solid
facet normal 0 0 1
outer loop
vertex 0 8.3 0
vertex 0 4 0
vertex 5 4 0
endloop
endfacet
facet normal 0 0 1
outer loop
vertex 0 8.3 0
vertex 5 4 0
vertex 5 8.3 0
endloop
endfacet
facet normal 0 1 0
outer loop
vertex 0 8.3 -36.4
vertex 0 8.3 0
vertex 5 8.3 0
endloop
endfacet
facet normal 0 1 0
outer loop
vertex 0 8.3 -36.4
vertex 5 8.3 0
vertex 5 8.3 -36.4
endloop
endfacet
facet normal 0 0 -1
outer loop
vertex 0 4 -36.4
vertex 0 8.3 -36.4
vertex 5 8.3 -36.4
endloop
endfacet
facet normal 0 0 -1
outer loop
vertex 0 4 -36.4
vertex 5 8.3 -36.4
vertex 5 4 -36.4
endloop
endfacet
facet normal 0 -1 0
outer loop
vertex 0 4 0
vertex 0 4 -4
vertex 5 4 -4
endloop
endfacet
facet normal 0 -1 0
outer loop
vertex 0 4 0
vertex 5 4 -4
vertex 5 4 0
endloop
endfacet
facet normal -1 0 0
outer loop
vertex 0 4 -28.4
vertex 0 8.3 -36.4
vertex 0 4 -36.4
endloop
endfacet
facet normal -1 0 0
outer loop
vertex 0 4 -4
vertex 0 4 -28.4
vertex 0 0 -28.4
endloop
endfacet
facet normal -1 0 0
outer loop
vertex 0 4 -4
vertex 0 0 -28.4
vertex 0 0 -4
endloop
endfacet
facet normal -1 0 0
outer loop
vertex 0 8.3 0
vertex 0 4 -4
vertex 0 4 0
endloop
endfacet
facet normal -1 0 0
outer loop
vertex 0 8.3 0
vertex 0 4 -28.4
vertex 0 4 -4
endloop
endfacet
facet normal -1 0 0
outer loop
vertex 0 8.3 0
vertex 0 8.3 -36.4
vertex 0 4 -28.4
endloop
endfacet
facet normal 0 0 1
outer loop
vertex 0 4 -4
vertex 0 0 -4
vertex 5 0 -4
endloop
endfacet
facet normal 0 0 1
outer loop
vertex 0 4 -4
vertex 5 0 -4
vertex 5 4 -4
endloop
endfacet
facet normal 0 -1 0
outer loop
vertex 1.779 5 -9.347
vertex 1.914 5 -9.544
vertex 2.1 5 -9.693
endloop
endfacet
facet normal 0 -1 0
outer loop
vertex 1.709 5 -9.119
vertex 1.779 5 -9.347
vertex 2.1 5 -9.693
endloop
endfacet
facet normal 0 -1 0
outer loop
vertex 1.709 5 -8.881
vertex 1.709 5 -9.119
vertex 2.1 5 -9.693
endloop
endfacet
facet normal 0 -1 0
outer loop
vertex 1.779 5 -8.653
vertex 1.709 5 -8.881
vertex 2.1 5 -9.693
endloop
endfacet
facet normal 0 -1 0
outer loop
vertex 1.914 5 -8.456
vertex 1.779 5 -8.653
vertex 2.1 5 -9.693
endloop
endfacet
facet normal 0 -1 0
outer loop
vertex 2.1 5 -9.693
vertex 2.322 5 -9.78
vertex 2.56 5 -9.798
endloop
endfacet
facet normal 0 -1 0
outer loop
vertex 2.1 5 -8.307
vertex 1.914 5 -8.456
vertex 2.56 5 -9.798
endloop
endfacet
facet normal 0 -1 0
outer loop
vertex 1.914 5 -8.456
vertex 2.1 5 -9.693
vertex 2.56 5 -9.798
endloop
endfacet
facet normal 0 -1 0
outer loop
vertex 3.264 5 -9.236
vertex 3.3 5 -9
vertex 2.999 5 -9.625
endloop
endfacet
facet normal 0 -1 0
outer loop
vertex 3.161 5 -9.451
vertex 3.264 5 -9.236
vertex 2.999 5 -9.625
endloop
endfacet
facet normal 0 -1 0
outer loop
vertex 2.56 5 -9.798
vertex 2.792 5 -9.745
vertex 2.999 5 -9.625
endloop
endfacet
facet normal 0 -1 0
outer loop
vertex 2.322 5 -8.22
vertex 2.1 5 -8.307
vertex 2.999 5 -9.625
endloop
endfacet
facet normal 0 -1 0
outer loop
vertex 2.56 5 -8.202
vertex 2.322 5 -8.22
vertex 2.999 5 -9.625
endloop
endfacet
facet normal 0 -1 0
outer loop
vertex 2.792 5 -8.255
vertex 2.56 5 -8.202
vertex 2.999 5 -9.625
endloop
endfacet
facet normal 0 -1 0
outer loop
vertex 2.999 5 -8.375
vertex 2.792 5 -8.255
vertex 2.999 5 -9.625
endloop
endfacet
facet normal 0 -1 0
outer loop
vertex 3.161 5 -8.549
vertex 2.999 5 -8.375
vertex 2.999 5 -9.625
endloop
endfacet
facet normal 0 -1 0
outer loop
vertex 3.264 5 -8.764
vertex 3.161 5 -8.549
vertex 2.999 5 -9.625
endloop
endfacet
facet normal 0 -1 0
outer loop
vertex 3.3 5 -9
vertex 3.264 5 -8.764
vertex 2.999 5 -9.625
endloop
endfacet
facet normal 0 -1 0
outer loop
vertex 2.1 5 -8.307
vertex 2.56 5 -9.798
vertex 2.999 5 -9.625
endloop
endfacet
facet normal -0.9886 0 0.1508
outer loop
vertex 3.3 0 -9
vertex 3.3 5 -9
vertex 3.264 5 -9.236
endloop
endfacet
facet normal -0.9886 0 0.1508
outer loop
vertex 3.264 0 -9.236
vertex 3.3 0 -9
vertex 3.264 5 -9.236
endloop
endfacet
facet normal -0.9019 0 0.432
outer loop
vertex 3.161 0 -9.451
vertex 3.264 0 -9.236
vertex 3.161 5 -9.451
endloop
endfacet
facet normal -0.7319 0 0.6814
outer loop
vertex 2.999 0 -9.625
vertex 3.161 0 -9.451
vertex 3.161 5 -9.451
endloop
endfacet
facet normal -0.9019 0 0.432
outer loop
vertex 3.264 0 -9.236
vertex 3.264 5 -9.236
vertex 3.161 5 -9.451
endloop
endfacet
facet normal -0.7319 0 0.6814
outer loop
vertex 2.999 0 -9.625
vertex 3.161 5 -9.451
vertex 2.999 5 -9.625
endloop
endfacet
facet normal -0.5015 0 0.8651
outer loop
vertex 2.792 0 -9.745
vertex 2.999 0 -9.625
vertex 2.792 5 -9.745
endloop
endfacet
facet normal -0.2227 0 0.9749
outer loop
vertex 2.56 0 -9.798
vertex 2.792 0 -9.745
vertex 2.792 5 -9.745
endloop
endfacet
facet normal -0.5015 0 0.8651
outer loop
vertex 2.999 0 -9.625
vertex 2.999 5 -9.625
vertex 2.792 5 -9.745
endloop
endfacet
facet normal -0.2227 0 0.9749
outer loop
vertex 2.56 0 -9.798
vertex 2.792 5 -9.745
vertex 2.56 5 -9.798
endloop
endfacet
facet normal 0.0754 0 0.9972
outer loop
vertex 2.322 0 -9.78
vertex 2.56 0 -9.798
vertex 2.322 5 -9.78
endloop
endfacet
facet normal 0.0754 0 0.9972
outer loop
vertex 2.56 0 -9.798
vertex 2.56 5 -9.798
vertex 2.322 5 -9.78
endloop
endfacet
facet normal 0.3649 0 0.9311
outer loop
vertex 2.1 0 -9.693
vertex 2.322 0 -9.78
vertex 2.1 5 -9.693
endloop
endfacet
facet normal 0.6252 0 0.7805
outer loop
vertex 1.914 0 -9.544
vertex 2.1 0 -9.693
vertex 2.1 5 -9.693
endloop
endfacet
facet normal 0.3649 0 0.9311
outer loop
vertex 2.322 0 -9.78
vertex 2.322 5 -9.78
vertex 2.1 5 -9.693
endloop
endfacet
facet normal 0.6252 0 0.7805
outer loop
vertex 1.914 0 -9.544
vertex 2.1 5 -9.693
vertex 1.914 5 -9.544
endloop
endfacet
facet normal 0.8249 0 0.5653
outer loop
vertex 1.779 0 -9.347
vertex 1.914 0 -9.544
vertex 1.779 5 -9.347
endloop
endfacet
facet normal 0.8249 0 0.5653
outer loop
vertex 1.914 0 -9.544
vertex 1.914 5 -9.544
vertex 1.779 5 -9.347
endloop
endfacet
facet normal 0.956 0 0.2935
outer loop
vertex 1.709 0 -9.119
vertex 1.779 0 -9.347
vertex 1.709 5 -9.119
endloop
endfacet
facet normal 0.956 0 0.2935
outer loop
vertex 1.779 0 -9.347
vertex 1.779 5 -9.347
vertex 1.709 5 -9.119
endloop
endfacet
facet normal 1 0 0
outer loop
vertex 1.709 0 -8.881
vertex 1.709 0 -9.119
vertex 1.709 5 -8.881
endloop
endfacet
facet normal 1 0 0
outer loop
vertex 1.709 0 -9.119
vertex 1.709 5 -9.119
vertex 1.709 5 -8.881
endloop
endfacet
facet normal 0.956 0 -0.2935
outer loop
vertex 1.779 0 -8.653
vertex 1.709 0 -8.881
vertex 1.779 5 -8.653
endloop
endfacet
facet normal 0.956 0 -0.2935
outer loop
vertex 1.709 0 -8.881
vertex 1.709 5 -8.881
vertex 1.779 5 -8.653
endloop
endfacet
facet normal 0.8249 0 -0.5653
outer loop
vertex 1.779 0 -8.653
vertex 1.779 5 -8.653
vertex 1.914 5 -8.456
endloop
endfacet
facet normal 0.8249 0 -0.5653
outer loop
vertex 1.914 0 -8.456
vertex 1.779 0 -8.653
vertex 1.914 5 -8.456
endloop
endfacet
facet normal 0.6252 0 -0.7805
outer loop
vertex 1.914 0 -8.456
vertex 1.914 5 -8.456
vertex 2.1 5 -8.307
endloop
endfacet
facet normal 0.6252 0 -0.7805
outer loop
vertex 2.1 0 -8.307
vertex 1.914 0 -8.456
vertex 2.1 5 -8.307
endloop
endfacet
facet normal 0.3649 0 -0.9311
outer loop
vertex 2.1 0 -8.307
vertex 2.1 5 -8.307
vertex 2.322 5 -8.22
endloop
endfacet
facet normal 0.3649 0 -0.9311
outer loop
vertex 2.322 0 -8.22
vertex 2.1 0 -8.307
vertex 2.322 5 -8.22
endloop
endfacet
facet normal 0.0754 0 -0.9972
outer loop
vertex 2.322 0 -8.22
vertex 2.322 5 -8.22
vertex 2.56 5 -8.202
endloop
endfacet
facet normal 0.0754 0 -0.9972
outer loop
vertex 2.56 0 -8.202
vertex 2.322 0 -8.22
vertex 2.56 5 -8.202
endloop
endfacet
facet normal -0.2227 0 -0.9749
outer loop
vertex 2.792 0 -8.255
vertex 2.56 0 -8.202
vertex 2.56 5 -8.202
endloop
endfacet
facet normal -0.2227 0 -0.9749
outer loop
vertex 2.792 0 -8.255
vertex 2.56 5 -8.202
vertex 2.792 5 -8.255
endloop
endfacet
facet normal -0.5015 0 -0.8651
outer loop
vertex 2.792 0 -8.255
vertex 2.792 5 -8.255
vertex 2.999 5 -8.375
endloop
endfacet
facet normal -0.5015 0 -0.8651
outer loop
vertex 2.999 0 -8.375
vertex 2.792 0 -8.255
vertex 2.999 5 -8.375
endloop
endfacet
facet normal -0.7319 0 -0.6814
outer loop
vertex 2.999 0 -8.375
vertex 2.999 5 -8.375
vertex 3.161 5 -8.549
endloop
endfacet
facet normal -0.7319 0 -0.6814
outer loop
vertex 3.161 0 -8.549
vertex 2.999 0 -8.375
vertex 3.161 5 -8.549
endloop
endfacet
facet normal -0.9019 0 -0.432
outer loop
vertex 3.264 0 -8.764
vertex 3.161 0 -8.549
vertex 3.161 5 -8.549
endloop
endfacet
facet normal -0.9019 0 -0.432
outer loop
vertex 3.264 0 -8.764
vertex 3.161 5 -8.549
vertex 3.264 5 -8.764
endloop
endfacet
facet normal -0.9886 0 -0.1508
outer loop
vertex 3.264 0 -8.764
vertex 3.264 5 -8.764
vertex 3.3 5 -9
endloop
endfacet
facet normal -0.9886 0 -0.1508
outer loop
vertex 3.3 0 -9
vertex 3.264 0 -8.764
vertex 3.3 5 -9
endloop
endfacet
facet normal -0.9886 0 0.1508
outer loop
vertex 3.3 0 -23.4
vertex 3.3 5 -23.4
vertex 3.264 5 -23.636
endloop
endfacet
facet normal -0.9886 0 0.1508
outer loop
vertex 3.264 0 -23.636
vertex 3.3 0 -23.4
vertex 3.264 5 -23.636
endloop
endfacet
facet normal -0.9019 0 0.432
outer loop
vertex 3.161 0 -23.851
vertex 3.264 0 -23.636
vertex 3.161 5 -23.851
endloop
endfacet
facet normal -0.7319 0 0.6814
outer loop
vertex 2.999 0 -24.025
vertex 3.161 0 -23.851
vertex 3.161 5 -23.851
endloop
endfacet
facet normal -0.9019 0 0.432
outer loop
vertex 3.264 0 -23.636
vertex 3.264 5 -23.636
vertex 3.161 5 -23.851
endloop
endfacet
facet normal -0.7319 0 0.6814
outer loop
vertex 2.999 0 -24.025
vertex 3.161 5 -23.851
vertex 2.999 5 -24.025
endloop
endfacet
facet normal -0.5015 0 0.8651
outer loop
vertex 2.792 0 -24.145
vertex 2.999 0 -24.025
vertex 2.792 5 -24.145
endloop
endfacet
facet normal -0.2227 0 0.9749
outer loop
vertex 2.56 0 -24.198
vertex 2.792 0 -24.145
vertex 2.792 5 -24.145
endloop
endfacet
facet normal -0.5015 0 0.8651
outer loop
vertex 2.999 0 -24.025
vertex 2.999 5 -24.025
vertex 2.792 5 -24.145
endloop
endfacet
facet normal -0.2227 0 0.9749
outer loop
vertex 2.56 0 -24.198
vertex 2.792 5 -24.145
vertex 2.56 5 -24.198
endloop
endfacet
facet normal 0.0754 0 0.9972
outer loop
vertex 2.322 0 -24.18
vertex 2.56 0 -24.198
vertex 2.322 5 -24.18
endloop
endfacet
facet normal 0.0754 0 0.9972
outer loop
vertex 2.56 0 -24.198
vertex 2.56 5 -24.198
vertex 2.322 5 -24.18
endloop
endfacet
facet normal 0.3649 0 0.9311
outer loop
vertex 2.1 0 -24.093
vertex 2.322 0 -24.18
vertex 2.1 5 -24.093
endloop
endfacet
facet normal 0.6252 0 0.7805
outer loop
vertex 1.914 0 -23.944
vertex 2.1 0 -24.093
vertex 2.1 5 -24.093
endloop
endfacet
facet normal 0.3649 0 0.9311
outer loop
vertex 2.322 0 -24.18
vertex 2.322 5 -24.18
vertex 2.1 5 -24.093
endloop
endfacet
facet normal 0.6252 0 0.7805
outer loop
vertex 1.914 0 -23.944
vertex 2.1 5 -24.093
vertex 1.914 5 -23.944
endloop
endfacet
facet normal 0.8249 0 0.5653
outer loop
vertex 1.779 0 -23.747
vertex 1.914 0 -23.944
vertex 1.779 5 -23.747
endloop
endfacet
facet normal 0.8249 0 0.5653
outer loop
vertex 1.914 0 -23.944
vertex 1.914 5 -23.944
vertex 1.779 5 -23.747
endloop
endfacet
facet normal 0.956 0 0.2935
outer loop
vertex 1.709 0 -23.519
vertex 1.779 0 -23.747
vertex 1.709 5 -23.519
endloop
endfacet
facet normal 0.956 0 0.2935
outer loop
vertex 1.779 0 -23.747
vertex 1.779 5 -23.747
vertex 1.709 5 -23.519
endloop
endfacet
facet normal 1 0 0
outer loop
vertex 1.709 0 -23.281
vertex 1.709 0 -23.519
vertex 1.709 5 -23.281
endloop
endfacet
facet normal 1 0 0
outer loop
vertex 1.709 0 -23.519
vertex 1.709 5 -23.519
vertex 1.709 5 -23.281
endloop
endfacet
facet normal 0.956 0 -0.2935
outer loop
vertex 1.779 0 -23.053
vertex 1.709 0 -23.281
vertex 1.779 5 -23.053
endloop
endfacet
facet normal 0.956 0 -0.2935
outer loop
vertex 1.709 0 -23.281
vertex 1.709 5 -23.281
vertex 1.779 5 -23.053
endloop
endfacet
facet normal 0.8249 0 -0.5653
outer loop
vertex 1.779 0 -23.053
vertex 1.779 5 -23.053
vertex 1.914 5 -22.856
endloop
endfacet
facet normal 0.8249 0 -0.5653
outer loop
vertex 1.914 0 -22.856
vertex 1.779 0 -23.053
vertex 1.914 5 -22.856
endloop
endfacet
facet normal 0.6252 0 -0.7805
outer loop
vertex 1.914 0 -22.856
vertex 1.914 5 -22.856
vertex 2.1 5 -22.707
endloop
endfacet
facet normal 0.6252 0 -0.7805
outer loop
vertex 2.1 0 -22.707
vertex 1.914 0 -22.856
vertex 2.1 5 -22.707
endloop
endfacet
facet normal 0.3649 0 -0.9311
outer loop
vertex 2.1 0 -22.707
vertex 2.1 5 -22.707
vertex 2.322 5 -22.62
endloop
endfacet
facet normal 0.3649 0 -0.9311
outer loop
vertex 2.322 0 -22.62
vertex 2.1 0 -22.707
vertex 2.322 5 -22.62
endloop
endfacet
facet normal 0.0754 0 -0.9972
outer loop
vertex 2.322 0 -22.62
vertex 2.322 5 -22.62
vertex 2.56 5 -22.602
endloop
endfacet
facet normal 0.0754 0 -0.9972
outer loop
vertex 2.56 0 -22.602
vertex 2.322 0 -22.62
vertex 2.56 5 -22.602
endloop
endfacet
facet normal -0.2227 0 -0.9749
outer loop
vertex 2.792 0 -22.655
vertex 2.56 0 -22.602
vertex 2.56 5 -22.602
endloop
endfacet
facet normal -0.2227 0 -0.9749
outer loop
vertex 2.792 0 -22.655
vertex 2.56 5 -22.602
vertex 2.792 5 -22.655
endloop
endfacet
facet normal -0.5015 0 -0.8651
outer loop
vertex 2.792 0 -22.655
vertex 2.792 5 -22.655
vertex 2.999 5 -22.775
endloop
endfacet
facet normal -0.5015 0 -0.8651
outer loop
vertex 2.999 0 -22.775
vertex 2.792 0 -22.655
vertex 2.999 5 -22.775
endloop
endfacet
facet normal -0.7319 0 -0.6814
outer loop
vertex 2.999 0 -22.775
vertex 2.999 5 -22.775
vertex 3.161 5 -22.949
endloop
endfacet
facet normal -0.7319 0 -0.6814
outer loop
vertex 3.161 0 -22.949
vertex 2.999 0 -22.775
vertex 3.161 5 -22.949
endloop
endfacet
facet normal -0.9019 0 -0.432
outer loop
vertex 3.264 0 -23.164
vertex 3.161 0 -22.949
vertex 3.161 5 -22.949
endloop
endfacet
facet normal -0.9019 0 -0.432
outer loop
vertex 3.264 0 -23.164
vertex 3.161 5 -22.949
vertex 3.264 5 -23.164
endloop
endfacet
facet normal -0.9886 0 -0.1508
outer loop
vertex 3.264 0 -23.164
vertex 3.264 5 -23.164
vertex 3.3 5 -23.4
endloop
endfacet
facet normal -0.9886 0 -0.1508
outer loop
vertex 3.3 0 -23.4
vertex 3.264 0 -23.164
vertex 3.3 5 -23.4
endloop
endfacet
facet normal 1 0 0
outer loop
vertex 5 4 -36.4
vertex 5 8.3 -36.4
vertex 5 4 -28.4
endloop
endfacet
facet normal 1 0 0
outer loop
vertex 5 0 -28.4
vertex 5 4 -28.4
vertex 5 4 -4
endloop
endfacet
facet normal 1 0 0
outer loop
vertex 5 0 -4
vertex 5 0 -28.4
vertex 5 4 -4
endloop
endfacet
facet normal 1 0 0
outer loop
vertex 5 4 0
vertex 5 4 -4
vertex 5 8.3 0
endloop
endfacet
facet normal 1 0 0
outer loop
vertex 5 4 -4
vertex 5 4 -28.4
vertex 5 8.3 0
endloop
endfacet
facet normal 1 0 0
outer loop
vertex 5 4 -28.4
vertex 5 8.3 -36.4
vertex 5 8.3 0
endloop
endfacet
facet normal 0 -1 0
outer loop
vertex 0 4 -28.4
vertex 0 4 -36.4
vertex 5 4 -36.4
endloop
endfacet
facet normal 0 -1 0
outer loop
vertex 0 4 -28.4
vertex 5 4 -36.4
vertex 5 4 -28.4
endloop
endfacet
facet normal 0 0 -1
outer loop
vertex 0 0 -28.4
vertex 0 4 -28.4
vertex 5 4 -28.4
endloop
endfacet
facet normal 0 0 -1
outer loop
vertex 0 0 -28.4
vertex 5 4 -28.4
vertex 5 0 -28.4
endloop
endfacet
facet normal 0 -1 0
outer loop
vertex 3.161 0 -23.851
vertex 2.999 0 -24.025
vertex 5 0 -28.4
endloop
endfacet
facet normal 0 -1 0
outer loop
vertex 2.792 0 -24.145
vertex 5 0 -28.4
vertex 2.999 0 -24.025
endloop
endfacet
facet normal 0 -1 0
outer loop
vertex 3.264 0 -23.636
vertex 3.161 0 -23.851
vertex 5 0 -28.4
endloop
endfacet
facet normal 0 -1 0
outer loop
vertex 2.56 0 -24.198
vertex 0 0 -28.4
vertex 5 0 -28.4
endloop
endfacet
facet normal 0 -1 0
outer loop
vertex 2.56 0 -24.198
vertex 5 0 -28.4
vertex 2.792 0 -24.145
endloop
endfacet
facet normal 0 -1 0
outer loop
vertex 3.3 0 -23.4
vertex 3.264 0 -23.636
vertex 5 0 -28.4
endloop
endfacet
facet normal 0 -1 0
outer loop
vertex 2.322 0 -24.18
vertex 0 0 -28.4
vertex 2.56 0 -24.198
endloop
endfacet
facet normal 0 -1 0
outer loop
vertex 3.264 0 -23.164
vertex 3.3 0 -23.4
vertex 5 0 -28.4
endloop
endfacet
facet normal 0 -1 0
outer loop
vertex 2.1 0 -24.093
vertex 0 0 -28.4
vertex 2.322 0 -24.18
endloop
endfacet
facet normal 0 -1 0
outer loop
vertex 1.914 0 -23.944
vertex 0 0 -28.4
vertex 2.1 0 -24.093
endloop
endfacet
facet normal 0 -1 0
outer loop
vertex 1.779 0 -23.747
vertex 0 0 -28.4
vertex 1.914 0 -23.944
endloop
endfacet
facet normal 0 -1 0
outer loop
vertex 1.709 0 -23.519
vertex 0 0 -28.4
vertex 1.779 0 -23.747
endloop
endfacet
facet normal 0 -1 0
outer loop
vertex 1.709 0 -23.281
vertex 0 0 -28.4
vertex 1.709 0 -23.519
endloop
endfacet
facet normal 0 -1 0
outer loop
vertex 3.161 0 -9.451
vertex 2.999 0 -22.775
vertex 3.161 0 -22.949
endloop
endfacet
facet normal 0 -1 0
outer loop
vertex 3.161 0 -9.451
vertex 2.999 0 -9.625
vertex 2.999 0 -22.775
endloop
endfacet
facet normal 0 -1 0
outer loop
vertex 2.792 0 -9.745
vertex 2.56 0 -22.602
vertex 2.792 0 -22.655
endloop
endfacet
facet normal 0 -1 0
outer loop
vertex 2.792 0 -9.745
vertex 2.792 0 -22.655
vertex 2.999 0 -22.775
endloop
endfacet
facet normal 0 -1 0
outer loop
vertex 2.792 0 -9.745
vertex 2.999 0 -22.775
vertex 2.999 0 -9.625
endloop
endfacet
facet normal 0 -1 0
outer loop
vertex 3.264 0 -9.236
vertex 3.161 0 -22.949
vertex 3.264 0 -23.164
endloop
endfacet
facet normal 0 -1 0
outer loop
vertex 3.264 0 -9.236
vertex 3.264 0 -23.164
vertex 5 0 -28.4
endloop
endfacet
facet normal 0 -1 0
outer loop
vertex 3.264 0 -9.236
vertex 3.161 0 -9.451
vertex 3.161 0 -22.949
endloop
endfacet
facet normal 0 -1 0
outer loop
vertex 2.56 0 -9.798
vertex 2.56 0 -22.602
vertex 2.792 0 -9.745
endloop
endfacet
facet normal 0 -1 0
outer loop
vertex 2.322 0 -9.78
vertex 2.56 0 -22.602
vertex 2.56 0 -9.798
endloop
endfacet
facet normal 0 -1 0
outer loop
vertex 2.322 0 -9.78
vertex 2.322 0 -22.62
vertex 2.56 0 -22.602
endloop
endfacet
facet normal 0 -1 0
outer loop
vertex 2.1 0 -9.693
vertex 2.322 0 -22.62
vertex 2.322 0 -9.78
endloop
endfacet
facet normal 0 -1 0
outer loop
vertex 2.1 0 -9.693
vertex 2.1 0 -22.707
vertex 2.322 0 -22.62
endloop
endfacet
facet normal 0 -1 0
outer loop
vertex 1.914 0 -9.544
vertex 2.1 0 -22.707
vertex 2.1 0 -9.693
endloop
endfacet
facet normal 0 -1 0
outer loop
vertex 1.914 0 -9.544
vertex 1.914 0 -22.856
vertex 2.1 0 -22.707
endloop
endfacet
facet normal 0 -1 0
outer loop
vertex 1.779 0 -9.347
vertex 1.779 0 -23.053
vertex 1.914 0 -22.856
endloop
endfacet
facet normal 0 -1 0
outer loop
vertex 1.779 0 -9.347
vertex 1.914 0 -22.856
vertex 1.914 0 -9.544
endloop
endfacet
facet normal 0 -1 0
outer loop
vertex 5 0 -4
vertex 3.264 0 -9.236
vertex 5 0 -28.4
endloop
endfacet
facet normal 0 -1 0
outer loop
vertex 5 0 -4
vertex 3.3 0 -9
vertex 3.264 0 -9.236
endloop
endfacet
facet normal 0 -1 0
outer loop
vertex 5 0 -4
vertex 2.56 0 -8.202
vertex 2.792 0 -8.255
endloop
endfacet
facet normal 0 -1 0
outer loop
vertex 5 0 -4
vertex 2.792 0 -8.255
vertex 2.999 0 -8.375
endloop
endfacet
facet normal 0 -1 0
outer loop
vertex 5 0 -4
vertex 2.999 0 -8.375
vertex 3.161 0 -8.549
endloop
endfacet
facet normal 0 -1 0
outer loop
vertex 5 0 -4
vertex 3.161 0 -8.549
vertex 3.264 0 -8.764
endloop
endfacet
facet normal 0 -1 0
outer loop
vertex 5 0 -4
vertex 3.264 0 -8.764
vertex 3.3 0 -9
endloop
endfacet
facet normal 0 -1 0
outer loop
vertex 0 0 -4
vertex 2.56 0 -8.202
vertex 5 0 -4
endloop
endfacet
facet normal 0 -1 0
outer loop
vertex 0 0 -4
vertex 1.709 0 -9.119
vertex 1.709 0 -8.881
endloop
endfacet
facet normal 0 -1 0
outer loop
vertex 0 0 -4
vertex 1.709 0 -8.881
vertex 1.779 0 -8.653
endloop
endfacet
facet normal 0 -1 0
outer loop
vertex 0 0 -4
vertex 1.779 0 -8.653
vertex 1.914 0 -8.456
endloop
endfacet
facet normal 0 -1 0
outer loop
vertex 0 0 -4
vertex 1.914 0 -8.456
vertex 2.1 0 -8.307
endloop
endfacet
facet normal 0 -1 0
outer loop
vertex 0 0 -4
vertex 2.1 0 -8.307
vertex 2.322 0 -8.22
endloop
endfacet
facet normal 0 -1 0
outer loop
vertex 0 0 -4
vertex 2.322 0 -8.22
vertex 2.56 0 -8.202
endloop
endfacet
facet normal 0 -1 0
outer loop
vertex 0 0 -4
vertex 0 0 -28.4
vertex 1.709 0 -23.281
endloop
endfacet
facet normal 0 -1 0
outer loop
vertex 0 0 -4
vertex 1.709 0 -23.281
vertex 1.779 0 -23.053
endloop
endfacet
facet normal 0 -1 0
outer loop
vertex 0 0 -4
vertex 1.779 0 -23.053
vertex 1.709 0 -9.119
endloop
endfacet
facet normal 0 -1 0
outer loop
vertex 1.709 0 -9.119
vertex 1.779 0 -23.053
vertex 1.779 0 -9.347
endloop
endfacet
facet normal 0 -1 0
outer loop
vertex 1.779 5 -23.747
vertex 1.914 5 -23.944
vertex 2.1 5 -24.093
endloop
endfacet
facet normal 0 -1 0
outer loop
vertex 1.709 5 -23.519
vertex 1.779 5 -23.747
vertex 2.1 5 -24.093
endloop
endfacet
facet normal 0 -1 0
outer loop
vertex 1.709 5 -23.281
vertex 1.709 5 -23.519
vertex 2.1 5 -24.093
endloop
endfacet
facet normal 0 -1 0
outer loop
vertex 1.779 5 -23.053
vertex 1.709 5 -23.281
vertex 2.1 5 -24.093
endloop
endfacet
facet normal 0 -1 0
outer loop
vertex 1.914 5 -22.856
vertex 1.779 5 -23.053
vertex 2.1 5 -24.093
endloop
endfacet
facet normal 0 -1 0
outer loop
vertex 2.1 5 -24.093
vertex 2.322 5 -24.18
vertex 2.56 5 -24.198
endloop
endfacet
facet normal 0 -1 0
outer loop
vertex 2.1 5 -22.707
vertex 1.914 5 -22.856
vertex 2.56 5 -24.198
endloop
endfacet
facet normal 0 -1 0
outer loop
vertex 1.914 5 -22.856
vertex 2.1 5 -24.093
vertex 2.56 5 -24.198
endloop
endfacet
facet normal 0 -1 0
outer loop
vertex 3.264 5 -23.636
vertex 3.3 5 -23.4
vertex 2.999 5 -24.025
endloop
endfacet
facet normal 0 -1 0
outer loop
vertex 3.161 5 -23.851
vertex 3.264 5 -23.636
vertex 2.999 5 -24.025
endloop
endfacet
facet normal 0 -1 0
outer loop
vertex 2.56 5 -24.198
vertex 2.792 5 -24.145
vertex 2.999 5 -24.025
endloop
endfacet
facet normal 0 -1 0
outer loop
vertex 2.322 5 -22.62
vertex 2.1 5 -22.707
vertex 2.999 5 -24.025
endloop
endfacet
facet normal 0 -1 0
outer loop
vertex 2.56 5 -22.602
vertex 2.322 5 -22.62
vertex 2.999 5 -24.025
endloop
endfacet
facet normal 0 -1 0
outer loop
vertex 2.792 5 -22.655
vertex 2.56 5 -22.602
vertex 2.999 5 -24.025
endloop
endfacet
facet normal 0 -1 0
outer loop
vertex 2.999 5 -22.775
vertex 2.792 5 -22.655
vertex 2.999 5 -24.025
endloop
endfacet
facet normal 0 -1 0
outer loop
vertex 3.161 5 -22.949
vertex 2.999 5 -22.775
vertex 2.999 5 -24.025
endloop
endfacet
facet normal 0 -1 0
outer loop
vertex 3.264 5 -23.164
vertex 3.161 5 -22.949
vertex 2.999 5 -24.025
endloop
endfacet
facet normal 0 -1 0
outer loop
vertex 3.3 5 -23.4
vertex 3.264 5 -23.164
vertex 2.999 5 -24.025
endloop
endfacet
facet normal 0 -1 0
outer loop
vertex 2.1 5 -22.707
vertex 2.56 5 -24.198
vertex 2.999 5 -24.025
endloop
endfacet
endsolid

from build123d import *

# Parameters (mm, degrees)
BOSS_EXTRUDE1_DEPTH             = 5
TAP_DRILL_FOR_M2X0_4_TAP1_D     = 1.6
TAP_DRILL_FOR_M2X0_4_TAP1_DEPTH = 5


with BuildPart() as part:
    # Sketch1 → Boss-Extrude1 (new body)
    with BuildSketch(Plane(origin=(0, 0, 0), x_dir=(0, 0, -1), z_dir=(1, 0, 0))):
        Polygon((0, 4), (0, 8.3), (36.4, 8.3), (36.4, 4), (28.4, 4), (28.4, 0), (4, 0), (4, 4), align=None)
    extrude(amount=BOSS_EXTRUDE1_DEPTH)

    # Tap Drill for M2x0.4 Tap1
    with Locations(Plane(origin=(0, 0, 0), x_dir=(-1, 0, 0), z_dir=(0, -1, 0))):
        with Locations((-2.5, 9), (-2.5, 23.4)):
            Hole(TAP_DRILL_FOR_M2X0_4_TAP1_D / 2, depth=TAP_DRILL_FOR_M2X0_4_TAP1_DEPTH)


solid = part.part
